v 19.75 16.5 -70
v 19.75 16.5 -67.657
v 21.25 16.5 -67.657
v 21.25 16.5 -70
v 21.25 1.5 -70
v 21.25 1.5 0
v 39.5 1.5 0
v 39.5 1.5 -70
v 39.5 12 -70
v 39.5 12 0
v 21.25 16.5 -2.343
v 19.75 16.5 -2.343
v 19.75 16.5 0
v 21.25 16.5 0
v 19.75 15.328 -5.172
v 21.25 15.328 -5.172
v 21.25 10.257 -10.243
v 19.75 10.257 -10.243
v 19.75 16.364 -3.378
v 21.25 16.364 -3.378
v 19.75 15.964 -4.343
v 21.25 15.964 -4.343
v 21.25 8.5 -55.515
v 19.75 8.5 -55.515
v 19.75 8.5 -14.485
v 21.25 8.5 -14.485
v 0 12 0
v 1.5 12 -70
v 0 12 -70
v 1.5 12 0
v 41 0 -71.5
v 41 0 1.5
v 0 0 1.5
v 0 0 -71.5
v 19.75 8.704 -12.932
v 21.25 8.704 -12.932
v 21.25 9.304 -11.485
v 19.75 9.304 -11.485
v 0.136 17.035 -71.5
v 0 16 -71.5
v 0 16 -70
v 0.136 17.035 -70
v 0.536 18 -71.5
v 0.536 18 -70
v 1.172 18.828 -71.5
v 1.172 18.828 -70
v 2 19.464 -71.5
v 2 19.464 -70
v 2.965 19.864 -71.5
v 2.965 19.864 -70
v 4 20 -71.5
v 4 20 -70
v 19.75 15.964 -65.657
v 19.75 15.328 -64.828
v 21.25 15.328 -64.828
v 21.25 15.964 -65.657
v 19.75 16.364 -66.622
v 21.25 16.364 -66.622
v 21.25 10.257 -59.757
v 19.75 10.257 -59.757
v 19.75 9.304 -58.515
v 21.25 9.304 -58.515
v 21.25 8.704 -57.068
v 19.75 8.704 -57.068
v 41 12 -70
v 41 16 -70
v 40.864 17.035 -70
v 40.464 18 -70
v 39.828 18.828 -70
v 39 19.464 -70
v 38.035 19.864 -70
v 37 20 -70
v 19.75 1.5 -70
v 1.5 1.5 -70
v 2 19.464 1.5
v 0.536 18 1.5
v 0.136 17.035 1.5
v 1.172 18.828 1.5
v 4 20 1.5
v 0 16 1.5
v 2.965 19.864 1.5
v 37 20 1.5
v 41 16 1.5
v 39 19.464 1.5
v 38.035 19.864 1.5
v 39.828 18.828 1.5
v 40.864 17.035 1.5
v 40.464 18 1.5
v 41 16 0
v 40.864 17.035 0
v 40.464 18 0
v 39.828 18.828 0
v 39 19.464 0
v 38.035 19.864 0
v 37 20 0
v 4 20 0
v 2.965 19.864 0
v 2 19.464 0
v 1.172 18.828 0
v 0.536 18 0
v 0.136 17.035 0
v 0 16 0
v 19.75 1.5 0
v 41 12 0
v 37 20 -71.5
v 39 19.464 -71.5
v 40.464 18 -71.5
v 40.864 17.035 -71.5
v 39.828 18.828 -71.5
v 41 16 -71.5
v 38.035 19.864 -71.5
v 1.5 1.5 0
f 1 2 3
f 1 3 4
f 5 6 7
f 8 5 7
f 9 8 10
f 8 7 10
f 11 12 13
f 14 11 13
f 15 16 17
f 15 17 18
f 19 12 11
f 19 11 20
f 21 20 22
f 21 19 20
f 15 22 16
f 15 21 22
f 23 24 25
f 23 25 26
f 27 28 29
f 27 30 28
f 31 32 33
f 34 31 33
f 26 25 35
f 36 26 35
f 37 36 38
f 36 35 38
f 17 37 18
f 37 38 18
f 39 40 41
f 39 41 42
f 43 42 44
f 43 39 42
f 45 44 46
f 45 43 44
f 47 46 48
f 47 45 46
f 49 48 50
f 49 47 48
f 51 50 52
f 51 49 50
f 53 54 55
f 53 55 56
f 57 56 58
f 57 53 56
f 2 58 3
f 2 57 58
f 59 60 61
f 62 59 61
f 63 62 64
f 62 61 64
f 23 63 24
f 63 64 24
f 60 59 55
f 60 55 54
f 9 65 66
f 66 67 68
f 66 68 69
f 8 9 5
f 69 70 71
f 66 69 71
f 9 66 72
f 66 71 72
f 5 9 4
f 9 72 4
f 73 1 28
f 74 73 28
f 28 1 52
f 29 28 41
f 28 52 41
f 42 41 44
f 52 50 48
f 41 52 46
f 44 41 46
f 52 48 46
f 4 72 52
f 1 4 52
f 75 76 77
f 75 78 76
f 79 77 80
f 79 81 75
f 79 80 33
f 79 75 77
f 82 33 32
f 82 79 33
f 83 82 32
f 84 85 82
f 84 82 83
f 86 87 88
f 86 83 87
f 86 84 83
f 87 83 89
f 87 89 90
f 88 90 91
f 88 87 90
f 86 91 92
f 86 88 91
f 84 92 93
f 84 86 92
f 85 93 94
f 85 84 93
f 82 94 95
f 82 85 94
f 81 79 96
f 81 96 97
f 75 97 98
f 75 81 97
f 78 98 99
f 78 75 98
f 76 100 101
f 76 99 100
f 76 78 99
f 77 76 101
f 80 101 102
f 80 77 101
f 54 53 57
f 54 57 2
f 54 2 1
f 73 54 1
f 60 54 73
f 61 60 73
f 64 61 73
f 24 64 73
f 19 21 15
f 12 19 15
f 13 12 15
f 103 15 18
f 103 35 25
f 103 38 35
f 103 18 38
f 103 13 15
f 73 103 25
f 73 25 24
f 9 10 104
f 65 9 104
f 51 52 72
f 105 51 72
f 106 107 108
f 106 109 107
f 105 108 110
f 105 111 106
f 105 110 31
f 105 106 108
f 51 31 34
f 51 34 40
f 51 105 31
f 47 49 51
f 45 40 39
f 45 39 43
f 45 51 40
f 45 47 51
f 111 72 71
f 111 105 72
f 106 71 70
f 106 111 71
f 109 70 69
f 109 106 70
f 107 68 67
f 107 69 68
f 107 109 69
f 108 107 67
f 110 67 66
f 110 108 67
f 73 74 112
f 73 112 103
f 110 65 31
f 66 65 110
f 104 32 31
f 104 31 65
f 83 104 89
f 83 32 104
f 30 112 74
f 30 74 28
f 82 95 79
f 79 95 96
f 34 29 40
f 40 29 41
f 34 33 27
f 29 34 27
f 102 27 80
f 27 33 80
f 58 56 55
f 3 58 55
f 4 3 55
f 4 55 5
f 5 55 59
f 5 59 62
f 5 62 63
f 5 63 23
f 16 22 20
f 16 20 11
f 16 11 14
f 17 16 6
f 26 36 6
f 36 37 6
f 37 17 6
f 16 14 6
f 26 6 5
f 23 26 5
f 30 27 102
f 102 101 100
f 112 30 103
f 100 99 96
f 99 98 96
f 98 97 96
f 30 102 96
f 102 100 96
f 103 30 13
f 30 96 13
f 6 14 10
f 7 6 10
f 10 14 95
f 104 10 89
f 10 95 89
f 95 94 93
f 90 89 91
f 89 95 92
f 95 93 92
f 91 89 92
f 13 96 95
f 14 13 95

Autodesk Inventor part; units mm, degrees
ref_plane "YZ Plane" through (0, 0, 0) normal (1, 0, 0) x (0, 1, 0)
ref_plane "XZ Plane" through (0, 0, 0) normal (0, 1, 0) x (-1, 0, 0)
sketch "Sketch1" plane through (0, 0, 0) normal (0, 0, 1) x (1, 0, 0)
  line L0 (0, 0) -> (41, 0)
  line L1 (41, 0) -> (41, 20)
  line L2 (41, 20) -> (0, 20)
  line L3 (0, 20) -> (0, 0)
  dimension "d0" = 41
  dimension "d1" = 20
extrude "Extrusion1" add sketch "Sketch1" along normal blind 1.5
fillet "Fillet1" radius 4 2 edges at (41, 20, 0.75) (0, 20, 0.75)
sketch "Sketch3" plane through (0, 0, 0) normal (0, 0, -1) x (-1, 0, 0)
  line L0 (0, 0) -> (-41, 0) projected
  line L1 (-41, 0) -> (-39.5, 0)
  line L2 (-39.5, 0) -> (-39.5, 12)
  line L3 (-39.5, 12) -> (-41, 12)
  line L4 (-41, 12) -> (-41, 0)
  dimension "d5" = 1.5
  dimension "d6" = 12
extrude "Extrusion2" add sketch "Sketch3" along normal blind 70
sketch "Sketch4" plane through (0, 0, 0) normal (0, 0, -1) x (-1, 0, 0)
  line L0 (0, 0) -> (-39.5, 0) projected
  line L1 (0, 0) -> (-1.5, 0)
  line L2 (-1.5, 0) -> (-1.5, 12)
  line L3 (-1.5, 12) -> (0, 12)
  line L4 (0, 12) -> (0, 0)
  dimension "d9" = 1.5
  dimension "d10" = 12
extrude "Extrusion3" add sketch "Sketch4" along normal blind 70
sketch "Sketch5" plane through (0, 0, -70) normal (0, 0, -1) x (-1, 0, 0)
  line L0 (-41, 0) -> (-41, 16) projected
  line L1 (-41, 0) -> (0, 0)
  line L2 (0, 0) -> (0, 20)
  line L3 (0, 20) -> (-41, 20)
  line L4 (-41, 20) -> (-41, 0)
extrude "Extrusion4" add sketch "Sketch5" along normal blind 1.5
fillet "Fillet2" radius 4 2 edges at (0, 20, -70.75) (41, 20, -70.75)
sketch "Sketch6" plane through (0, 0, 1.5) normal (0, -1, 0) x (1, 0, 0)
  line L0 (4, -73) -> (0, -73) projected
  line L1 (41, 0) -> (41, -1.5) projected
  line L2 (0, -73) -> (41, -73)
  line L3 (41, -73) -> (41, 0)
  line L4 (41, 0) -> (0, 0)
  line L5 (0, 0) -> (0, -73)
  point P0 (0, -1.5)
extrude "Extrusion5" add sketch "Sketch6" against normal blind 1.5
ref_plane "Work Plane1" through (20.5, 0, 1.5) normal (1, 0, 0) x (0, 0, -1)
sketch "Sketch9" plane through (20.5, 0, 1.5) normal (1, 0, 0) x (0, 0, -1)
  line L0 (71.5, 1.5) -> (59.5, 1.5)
  line L1 (59.5, 1.5) -> (59.5, 16.5)
  line L2 (59.5, 16.5) -> (71.5, 16.5)
  line L3 (71.5, 16.5) -> (71.5, 1.5)
  point P0 (1.5, 0)
  dimension "d25" = 12
  dimension "d26" = 15
extrude "Extrusion6" add sketch "Sketch9" along normal mid plane 1.5
chamfer "Chamfer1" distance 8 angle 45 1 edges at (20.5, 16.5, -58)
fillet "Fillet3" radius 4 1 edges at (20.5, 16.5, -66)
sketch "Sketch10" plane through (20.5, 0, 1.5) normal (1, 0, 0) x (0, 0, -1)
  line L0 (1.5, 1.5) -> (13.5, 1.5)
  line L1 (13.5, 1.5) -> (13.5, 16.5)
  line L2 (13.5, 16.5) -> (1.5, 16.5)
  line L3 (1.5, 16.5) -> (1.5, 1.5)
  point P0 (1.5, 0)
  dimension "d27" = 12
  dimension "d28" = 15
extrude "Extrusion7" add sketch "Sketch10" along normal mid plane 1.5
chamfer "Chamfer2" distance 8 angle 45 1 edges at (20.5, 16.5, -12)
fillet "Fillet4" radius 4 1 edges at (20.5, 16.5, -4)
sketch "Sketch11" plane through (21.25, 1.5, -12) normal (0, 0, -1) x (-1, 0, 0)
  line L0 (1.5, 7) -> (1.5, 0) projected
  line L1 (0, 0) -> (1.5, 0)
  line L2 (1.5, 0) -> (1.5, 7)
  line L3 (1.5, 7) -> (0, 7)
  line L4 (0, 7) -> (0, 0)
  point P0 (21.25, -1.5)
extrude "Extrusion8" add sketch "Sketch11" along normal blind 50
fillet "Fillet5" radius 6 2 edges at (20.5, 8.5, -58) (20.5, 8.5, -12)
properties part number "porta pila"
